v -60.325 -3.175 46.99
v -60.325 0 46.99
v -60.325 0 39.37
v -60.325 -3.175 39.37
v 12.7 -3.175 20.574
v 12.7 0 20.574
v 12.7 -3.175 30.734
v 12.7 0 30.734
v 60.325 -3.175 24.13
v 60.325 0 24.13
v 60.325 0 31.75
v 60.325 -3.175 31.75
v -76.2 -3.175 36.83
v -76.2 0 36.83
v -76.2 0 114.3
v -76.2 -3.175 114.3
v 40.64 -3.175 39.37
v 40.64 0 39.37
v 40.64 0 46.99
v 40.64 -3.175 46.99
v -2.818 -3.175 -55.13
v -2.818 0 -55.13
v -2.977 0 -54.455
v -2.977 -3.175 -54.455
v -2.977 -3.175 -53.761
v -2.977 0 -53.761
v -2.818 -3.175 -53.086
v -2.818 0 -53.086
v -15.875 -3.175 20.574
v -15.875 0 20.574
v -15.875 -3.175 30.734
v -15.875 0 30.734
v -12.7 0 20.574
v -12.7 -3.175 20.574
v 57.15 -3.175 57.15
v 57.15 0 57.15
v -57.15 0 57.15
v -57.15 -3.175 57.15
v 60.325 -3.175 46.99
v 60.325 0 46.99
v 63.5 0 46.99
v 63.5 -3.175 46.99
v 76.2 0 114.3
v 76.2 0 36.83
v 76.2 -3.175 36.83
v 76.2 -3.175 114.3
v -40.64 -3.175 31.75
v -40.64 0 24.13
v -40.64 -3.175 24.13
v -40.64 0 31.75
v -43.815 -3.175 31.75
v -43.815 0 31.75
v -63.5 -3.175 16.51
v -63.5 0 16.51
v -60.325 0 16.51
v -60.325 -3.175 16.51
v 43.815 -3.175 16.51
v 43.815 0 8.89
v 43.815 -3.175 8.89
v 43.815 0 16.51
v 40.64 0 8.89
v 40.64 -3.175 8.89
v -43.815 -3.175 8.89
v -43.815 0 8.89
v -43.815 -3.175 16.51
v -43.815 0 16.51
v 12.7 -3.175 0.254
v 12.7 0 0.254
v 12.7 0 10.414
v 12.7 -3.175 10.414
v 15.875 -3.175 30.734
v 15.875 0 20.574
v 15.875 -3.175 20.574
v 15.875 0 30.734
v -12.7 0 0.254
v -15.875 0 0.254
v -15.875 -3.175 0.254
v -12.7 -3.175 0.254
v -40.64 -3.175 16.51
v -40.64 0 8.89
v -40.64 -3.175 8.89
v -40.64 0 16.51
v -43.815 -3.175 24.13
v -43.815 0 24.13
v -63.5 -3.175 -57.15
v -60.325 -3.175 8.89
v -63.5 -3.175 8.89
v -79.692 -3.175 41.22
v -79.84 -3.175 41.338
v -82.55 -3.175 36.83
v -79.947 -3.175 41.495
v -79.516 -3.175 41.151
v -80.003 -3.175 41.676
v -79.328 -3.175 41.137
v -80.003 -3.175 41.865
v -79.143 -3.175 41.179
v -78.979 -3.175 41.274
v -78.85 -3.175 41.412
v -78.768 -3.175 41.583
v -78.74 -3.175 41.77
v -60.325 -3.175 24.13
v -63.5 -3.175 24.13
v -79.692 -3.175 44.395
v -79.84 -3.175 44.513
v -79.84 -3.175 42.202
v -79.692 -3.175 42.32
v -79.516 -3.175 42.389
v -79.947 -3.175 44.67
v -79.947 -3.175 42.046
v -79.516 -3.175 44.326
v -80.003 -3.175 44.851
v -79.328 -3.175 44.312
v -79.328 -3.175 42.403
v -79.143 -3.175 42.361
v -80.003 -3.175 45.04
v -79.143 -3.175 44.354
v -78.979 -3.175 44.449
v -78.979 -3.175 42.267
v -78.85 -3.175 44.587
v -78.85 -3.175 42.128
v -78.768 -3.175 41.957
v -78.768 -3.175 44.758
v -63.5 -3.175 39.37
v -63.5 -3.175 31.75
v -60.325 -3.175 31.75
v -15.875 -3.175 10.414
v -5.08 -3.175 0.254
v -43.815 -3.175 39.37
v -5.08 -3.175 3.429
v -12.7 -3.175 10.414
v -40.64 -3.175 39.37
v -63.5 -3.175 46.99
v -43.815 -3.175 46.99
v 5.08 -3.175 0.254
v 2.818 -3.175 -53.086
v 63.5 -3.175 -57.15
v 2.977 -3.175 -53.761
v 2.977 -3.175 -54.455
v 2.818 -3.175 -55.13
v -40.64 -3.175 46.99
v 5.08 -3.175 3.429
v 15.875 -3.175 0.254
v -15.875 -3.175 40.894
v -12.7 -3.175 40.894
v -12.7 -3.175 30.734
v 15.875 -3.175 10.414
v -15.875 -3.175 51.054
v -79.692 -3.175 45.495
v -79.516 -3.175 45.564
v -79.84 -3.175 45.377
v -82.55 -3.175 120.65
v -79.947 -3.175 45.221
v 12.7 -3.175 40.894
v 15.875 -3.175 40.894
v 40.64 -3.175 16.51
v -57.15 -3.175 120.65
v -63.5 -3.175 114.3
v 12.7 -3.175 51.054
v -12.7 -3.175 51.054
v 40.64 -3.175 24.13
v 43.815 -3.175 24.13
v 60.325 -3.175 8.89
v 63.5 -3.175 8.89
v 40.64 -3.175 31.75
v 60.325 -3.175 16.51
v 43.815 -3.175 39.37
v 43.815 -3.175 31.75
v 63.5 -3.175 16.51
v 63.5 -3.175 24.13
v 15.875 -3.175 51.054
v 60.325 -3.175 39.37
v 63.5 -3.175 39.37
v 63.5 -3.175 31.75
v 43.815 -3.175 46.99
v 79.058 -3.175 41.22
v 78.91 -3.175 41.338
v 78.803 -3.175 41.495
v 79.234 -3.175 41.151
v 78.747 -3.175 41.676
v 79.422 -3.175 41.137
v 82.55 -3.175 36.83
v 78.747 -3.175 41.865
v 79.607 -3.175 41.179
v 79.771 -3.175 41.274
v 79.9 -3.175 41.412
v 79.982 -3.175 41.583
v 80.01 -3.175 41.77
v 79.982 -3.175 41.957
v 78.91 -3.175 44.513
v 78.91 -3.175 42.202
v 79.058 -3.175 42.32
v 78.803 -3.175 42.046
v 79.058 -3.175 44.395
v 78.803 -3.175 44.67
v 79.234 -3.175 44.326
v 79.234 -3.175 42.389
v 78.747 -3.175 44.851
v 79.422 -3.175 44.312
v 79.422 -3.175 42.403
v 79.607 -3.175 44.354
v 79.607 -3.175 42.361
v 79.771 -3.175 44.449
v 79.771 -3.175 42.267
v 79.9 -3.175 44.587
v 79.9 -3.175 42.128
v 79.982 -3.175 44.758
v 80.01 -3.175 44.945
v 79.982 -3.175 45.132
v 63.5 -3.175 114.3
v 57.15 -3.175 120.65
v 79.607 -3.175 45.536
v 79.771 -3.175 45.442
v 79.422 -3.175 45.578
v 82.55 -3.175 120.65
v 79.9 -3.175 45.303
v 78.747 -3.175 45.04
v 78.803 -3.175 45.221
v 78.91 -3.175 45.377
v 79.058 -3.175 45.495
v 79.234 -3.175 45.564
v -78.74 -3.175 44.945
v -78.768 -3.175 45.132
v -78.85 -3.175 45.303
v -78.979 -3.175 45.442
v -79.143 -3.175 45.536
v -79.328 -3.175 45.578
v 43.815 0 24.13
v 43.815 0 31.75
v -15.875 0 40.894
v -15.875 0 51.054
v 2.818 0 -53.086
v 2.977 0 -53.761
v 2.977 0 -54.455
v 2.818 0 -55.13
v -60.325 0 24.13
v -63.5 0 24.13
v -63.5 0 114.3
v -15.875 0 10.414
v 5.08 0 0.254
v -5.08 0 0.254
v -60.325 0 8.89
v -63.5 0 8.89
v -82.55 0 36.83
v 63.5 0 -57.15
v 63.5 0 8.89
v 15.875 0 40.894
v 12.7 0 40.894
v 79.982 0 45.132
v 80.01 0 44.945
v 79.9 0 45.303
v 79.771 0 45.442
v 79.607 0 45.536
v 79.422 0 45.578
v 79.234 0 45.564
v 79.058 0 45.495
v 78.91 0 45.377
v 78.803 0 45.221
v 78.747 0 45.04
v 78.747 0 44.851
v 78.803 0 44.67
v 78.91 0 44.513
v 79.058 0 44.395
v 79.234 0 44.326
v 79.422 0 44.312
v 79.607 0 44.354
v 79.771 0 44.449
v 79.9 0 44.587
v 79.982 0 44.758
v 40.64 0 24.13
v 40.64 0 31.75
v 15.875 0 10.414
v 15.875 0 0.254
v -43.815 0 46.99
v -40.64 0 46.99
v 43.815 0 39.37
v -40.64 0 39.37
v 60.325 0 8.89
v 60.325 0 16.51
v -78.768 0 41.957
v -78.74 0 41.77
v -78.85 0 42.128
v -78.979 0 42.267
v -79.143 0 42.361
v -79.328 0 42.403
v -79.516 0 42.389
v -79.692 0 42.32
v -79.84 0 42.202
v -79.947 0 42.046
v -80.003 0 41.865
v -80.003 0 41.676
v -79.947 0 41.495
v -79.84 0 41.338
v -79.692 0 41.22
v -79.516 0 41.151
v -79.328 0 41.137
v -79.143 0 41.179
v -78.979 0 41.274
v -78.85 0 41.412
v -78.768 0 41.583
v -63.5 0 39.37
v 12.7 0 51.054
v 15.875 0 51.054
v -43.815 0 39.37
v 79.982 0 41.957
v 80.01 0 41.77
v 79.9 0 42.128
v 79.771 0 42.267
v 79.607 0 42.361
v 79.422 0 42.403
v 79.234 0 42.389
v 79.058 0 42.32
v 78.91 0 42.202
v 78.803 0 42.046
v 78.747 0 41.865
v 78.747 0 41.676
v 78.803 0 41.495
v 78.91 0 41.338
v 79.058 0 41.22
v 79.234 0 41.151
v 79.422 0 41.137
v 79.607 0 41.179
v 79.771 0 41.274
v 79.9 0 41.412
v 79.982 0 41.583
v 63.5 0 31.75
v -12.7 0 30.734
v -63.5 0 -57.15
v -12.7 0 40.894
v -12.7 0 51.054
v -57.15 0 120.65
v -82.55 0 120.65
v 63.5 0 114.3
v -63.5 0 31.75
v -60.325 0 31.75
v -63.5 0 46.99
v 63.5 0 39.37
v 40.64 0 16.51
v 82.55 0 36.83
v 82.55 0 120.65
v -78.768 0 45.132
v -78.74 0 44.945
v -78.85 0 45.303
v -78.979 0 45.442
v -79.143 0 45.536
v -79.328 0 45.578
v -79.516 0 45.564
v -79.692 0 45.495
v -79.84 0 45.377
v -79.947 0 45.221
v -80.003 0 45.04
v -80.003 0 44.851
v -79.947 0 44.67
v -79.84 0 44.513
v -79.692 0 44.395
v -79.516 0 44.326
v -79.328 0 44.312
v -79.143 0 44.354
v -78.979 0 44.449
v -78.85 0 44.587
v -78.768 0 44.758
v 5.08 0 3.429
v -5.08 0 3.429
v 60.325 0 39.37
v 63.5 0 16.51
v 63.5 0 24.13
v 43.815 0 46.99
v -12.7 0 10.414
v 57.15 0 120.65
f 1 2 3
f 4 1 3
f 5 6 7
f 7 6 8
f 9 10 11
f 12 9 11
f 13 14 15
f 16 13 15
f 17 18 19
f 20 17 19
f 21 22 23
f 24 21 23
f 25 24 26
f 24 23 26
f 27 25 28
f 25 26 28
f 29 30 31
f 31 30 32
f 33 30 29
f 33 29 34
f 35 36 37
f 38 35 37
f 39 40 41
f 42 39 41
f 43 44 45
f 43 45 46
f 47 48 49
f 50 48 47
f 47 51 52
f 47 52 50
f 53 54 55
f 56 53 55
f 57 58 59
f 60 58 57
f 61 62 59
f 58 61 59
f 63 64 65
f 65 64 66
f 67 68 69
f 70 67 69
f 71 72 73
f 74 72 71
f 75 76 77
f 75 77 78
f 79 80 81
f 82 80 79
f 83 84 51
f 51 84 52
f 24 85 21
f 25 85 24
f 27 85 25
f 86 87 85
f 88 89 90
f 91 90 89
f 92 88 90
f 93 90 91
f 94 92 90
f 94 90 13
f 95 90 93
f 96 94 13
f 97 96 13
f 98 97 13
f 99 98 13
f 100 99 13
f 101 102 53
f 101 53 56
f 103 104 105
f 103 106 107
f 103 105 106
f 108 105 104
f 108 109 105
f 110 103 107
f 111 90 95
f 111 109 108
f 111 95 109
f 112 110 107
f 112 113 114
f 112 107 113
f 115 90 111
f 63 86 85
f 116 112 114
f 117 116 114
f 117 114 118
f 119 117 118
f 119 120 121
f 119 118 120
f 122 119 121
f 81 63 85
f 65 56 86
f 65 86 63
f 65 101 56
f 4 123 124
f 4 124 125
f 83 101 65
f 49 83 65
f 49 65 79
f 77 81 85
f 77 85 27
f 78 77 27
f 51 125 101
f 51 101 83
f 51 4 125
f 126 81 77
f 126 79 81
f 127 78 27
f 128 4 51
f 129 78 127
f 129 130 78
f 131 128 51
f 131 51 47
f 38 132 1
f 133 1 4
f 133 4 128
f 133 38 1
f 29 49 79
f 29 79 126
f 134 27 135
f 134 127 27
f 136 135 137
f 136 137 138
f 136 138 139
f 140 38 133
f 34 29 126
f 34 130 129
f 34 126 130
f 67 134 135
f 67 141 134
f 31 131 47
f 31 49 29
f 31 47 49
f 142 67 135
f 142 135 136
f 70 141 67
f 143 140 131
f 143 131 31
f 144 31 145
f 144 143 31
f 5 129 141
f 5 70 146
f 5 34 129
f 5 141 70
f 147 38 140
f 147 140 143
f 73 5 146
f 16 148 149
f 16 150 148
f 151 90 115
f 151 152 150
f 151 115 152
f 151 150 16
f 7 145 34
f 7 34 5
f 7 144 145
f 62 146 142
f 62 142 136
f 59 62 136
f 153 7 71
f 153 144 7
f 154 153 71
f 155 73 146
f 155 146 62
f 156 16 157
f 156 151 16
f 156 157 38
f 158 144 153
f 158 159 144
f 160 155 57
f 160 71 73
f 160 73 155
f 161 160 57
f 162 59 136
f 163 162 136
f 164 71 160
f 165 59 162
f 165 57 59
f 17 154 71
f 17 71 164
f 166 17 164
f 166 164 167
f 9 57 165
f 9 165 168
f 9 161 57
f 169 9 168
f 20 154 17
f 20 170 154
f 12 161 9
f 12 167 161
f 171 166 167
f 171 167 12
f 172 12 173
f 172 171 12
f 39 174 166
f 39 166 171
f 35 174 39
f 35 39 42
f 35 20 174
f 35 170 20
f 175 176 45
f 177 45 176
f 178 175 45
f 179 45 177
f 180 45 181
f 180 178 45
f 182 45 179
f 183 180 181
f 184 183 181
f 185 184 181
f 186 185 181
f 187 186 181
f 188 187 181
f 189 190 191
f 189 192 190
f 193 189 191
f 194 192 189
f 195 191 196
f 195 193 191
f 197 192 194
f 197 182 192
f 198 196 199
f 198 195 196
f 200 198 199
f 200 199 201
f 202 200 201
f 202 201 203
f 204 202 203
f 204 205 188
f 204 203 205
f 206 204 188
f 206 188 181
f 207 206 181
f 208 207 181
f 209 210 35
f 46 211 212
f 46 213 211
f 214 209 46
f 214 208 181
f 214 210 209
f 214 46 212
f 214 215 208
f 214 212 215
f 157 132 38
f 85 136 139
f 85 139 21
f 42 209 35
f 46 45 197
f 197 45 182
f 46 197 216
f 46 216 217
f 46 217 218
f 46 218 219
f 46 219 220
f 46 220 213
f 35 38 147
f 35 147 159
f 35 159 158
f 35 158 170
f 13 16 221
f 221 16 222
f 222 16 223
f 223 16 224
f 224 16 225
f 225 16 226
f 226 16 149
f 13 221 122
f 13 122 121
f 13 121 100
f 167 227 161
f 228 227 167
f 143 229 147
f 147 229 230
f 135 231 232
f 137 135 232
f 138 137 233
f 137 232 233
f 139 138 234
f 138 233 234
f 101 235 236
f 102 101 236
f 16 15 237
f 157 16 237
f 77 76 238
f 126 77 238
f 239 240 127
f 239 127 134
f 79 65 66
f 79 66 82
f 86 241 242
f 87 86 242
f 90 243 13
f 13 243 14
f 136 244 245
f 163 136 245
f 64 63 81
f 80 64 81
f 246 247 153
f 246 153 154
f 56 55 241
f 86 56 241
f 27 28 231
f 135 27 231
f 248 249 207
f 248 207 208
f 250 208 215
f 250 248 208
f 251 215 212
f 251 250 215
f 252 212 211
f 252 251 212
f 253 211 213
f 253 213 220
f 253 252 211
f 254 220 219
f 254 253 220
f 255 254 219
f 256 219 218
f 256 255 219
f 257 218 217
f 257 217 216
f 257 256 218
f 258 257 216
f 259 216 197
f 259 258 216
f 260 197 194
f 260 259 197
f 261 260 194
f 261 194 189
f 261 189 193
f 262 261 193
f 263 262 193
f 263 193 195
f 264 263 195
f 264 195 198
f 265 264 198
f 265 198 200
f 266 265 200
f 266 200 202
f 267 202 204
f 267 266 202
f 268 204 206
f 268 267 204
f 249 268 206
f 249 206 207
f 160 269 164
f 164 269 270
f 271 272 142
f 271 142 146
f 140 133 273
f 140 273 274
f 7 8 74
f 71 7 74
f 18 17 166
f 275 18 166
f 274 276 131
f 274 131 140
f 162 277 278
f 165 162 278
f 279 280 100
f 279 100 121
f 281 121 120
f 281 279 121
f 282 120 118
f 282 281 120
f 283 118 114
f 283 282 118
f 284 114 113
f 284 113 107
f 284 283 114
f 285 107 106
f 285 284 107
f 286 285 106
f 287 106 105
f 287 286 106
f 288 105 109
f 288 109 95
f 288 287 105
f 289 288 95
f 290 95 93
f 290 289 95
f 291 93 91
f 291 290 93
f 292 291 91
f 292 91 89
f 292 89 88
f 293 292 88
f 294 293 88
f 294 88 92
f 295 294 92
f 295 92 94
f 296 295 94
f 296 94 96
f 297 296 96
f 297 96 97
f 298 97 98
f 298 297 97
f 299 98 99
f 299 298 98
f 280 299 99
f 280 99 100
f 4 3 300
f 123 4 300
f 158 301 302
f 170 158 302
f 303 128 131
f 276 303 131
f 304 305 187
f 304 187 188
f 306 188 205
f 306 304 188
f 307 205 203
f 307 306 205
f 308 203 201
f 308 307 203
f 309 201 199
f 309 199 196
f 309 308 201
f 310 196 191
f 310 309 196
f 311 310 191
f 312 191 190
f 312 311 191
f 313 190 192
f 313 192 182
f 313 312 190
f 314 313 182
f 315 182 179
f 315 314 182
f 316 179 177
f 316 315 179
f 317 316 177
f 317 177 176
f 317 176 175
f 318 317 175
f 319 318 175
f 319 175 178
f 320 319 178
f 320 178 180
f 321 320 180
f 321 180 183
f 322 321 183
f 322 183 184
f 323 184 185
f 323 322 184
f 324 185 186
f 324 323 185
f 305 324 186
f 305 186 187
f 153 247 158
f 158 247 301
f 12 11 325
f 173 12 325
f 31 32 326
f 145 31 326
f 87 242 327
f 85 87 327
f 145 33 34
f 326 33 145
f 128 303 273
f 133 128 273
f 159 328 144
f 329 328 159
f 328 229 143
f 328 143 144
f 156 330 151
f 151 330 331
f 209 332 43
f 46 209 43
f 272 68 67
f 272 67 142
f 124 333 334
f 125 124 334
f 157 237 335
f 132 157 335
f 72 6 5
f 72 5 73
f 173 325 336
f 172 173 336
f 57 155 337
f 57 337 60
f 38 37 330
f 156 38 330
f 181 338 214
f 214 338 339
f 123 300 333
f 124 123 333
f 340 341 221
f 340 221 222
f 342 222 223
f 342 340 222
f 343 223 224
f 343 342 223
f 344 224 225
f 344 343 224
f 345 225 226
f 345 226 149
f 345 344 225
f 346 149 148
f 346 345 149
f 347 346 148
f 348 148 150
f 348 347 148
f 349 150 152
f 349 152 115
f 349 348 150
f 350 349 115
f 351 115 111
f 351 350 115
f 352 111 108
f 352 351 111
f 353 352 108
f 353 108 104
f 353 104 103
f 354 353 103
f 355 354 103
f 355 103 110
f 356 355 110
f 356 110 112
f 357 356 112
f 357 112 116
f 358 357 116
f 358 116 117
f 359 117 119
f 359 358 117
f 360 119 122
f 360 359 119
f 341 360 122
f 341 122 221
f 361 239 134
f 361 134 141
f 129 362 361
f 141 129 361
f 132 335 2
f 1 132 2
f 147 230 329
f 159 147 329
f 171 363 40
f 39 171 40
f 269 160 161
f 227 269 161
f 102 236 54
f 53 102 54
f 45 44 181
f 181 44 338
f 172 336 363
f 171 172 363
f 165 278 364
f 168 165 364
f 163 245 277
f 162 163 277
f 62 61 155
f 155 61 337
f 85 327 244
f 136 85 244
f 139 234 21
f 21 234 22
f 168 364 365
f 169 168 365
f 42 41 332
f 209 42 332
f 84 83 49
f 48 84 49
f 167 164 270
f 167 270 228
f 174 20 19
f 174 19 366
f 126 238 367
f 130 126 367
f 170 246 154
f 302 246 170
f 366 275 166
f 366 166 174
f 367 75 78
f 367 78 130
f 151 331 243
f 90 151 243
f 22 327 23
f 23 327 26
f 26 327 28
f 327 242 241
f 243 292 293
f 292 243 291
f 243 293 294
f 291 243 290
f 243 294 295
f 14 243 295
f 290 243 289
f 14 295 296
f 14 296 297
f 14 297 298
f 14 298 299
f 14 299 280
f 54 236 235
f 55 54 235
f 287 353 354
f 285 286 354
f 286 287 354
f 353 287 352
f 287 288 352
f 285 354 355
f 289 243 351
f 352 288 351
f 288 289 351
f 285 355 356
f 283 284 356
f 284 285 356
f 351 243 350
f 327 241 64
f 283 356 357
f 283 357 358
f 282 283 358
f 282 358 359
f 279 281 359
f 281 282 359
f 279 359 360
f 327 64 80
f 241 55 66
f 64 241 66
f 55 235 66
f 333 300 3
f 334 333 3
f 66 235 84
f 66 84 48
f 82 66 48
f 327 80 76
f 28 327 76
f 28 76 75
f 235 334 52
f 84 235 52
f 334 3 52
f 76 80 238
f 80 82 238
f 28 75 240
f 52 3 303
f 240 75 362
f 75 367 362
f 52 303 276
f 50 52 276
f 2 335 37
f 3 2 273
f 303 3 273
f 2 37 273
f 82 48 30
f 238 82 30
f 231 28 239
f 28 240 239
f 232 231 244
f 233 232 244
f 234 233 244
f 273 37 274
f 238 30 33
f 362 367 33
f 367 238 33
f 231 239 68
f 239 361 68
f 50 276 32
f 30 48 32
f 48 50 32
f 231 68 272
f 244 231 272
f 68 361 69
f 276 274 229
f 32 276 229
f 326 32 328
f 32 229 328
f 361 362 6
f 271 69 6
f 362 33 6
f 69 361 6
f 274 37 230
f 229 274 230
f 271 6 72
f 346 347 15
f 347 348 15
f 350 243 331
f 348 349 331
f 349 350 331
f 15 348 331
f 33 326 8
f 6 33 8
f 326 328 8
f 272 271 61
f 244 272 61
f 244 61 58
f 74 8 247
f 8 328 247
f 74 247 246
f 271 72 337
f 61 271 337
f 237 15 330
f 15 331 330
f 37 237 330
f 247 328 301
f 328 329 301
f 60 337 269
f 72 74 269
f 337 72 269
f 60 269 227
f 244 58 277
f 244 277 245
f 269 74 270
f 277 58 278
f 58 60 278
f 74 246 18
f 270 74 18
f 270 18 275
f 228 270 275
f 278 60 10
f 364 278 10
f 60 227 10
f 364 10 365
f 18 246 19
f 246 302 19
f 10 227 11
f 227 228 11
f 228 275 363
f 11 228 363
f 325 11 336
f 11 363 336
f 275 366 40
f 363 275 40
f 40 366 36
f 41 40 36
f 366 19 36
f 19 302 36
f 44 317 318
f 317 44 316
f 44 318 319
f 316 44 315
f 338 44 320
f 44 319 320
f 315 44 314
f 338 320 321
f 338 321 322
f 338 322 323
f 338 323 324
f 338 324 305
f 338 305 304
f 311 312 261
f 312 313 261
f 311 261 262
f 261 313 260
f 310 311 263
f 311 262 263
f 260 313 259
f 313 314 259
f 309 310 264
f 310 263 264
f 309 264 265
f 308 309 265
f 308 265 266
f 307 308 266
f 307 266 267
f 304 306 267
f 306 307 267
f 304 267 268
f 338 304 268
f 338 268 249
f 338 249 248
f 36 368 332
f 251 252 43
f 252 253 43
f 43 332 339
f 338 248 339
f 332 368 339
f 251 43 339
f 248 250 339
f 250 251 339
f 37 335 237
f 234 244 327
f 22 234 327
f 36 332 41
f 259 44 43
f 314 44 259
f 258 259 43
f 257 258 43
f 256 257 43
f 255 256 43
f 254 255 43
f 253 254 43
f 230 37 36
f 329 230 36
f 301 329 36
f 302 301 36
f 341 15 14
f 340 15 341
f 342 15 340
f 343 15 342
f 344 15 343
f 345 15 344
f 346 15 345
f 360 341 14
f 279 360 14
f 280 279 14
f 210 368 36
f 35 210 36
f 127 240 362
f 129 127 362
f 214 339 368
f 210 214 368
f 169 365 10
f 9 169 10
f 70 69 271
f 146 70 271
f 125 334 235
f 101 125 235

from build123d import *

# Parameters (mm, degrees)
F0_W     = 12.7
F0_H     = 6.35
F0_W_2   = 6.35
F0_H_2   = 77.47
F0_R     = 0.635
F0_W_3   = 3.175
F0_H_3   = 7.62
F0_H_4   = 10.16
F0_W_4   = 10.16
F0_H_5   = 3.175
F1_DEPTH = 3.175


# Not quite as in the source:
# - a feature names something its author has since deleted; it is built from what else it names


with BuildPart() as f1:
    # F0 (on Front) → F1 (new body)
    with BuildSketch(Plane.XZ):
        Polygon((-63.5, 57.15), (-57.15, 57.15), (-57.15, 120.65), (-63.5, 120.65), (-63.5, 114.3), align=None)
        with Locations((-69.85, 117.475)):
            Rectangle(F0_W, F0_H)
        with Locations((-79.375, 117.475)):
            Rectangle(F0_W_2, F0_H)
        with Locations((-79.375, 75.565)):
            Rectangle(F0_W_2, F0_H_2)
        with Locations((-79.375, 41.7701676488)):
            Circle(F0_R, mode=Mode.SUBTRACT)
        with Locations((-79.375, 44.9451676488)):
            Circle(F0_R, mode=Mode.SUBTRACT)
        Polygon((57.15, 57.15), (63.5, 57.15), (63.5, 114.3), (63.5, 120.65), (57.15, 120.65), align=None)
        Polygon((63.5, 120.65), (63.5, 114.3), (76.2, 114.3), (82.55, 114.3), (82.55, 120.65), align=None)
        with Locations((79.375, 75.565)):
            Rectangle(F0_W_2, F0_H_2)
        with Locations((79.375, 41.7701676488)):
            Circle(F0_R, mode=Mode.SUBTRACT)
        with Locations((79.375, 44.9451676488)):
            Circle(F0_R, mode=Mode.SUBTRACT)
        Polygon((63.5, 46.99), (63.5, 57.15), (57.15, 57.15), (-57.15, 57.15), (-63.5, 57.15), (-63.5, 46.99), (-60.325, 46.99), (-60.325, 39.37), (-63.5, 39.37), (-63.5, 31.75), (-60.325, 31.75), (-60.325, 24.13), (-63.5, 24.13), (-63.5, 16.51), (-60.325, 16.51), (-60.325, 8.89), (-63.5, 8.89), (-63.5, -57.15), (63.5, -57.15), (63.5, 8.89), (60.325, 8.89), (60.325, 16.51), (63.5, 16.51), (63.5, 24.13), (60.325, 24.13), (60.325, 31.75), (63.5, 31.75), (63.5, 39.37), (60.325, 39.37), (60.325, 46.99), align=None)
        with Locations((-42.2275, 12.7)):
            Rectangle(F0_W_3, F0_H_3, mode=Mode.SUBTRACT)
        with Locations((-42.2275, 27.94)):
            Rectangle(F0_W_3, F0_H_3, mode=Mode.SUBTRACT)
        with Locations((-14.2875, 5.3341257808)):
            Rectangle(F0_W_3, F0_H_4, mode=Mode.SUBTRACT)
        with Locations((-14.2875, 25.6541257808)):
            Rectangle(F0_W_3, F0_H_4, mode=Mode.SUBTRACT)
        with BuildLine():
            ThreePointArc((2.8175964356, -53.0858742192), (2.9972, -54.1078126547), (2.8175964356, -55.1297510902))
            Line((2.8175964356, -55.1297510902), (-2.8175964356, -55.1297510902))
            ThreePointArc((-2.8175964356, -55.1297510902), (-2.9972, -54.1078126547), (-2.8175964356, -53.0858742192))
            Line((-2.8175964356, -53.0858742192), (2.8175964356, -53.0858742192))
        make_face(mode=Mode.SUBTRACT)
        with Locations((0, 1.8416257808)):
            Rectangle(F0_W_4, F0_H_5, mode=Mode.SUBTRACT)
        with Locations((14.2875, 5.3341257808)):
            Rectangle(F0_W_3, F0_H_4, mode=Mode.SUBTRACT)
        with Locations((14.2875, 25.6541257808)):
            Rectangle(F0_W_3, F0_H_4, mode=Mode.SUBTRACT)
        with Locations((42.2275, 12.7)):
            Rectangle(F0_W_3, F0_H_3, mode=Mode.SUBTRACT)
        with Locations((42.2275, 27.94)):
            Rectangle(F0_W_3, F0_H_3, mode=Mode.SUBTRACT)
        with Locations((-42.2275, 43.18)):
            Rectangle(F0_W_3, F0_H_3, mode=Mode.SUBTRACT)
        with Locations((-14.2875, 45.9741257808)):
            Rectangle(F0_W_3, F0_H_4, mode=Mode.SUBTRACT)
        with Locations((14.2875, 45.9741257808)):
            Rectangle(F0_W_3, F0_H_4, mode=Mode.SUBTRACT)
        with Locations((42.2275, 43.18)):
            Rectangle(F0_W_3, F0_H_3, mode=Mode.SUBTRACT)
    extrude(amount=F1_DEPTH)


solid = f1.part
